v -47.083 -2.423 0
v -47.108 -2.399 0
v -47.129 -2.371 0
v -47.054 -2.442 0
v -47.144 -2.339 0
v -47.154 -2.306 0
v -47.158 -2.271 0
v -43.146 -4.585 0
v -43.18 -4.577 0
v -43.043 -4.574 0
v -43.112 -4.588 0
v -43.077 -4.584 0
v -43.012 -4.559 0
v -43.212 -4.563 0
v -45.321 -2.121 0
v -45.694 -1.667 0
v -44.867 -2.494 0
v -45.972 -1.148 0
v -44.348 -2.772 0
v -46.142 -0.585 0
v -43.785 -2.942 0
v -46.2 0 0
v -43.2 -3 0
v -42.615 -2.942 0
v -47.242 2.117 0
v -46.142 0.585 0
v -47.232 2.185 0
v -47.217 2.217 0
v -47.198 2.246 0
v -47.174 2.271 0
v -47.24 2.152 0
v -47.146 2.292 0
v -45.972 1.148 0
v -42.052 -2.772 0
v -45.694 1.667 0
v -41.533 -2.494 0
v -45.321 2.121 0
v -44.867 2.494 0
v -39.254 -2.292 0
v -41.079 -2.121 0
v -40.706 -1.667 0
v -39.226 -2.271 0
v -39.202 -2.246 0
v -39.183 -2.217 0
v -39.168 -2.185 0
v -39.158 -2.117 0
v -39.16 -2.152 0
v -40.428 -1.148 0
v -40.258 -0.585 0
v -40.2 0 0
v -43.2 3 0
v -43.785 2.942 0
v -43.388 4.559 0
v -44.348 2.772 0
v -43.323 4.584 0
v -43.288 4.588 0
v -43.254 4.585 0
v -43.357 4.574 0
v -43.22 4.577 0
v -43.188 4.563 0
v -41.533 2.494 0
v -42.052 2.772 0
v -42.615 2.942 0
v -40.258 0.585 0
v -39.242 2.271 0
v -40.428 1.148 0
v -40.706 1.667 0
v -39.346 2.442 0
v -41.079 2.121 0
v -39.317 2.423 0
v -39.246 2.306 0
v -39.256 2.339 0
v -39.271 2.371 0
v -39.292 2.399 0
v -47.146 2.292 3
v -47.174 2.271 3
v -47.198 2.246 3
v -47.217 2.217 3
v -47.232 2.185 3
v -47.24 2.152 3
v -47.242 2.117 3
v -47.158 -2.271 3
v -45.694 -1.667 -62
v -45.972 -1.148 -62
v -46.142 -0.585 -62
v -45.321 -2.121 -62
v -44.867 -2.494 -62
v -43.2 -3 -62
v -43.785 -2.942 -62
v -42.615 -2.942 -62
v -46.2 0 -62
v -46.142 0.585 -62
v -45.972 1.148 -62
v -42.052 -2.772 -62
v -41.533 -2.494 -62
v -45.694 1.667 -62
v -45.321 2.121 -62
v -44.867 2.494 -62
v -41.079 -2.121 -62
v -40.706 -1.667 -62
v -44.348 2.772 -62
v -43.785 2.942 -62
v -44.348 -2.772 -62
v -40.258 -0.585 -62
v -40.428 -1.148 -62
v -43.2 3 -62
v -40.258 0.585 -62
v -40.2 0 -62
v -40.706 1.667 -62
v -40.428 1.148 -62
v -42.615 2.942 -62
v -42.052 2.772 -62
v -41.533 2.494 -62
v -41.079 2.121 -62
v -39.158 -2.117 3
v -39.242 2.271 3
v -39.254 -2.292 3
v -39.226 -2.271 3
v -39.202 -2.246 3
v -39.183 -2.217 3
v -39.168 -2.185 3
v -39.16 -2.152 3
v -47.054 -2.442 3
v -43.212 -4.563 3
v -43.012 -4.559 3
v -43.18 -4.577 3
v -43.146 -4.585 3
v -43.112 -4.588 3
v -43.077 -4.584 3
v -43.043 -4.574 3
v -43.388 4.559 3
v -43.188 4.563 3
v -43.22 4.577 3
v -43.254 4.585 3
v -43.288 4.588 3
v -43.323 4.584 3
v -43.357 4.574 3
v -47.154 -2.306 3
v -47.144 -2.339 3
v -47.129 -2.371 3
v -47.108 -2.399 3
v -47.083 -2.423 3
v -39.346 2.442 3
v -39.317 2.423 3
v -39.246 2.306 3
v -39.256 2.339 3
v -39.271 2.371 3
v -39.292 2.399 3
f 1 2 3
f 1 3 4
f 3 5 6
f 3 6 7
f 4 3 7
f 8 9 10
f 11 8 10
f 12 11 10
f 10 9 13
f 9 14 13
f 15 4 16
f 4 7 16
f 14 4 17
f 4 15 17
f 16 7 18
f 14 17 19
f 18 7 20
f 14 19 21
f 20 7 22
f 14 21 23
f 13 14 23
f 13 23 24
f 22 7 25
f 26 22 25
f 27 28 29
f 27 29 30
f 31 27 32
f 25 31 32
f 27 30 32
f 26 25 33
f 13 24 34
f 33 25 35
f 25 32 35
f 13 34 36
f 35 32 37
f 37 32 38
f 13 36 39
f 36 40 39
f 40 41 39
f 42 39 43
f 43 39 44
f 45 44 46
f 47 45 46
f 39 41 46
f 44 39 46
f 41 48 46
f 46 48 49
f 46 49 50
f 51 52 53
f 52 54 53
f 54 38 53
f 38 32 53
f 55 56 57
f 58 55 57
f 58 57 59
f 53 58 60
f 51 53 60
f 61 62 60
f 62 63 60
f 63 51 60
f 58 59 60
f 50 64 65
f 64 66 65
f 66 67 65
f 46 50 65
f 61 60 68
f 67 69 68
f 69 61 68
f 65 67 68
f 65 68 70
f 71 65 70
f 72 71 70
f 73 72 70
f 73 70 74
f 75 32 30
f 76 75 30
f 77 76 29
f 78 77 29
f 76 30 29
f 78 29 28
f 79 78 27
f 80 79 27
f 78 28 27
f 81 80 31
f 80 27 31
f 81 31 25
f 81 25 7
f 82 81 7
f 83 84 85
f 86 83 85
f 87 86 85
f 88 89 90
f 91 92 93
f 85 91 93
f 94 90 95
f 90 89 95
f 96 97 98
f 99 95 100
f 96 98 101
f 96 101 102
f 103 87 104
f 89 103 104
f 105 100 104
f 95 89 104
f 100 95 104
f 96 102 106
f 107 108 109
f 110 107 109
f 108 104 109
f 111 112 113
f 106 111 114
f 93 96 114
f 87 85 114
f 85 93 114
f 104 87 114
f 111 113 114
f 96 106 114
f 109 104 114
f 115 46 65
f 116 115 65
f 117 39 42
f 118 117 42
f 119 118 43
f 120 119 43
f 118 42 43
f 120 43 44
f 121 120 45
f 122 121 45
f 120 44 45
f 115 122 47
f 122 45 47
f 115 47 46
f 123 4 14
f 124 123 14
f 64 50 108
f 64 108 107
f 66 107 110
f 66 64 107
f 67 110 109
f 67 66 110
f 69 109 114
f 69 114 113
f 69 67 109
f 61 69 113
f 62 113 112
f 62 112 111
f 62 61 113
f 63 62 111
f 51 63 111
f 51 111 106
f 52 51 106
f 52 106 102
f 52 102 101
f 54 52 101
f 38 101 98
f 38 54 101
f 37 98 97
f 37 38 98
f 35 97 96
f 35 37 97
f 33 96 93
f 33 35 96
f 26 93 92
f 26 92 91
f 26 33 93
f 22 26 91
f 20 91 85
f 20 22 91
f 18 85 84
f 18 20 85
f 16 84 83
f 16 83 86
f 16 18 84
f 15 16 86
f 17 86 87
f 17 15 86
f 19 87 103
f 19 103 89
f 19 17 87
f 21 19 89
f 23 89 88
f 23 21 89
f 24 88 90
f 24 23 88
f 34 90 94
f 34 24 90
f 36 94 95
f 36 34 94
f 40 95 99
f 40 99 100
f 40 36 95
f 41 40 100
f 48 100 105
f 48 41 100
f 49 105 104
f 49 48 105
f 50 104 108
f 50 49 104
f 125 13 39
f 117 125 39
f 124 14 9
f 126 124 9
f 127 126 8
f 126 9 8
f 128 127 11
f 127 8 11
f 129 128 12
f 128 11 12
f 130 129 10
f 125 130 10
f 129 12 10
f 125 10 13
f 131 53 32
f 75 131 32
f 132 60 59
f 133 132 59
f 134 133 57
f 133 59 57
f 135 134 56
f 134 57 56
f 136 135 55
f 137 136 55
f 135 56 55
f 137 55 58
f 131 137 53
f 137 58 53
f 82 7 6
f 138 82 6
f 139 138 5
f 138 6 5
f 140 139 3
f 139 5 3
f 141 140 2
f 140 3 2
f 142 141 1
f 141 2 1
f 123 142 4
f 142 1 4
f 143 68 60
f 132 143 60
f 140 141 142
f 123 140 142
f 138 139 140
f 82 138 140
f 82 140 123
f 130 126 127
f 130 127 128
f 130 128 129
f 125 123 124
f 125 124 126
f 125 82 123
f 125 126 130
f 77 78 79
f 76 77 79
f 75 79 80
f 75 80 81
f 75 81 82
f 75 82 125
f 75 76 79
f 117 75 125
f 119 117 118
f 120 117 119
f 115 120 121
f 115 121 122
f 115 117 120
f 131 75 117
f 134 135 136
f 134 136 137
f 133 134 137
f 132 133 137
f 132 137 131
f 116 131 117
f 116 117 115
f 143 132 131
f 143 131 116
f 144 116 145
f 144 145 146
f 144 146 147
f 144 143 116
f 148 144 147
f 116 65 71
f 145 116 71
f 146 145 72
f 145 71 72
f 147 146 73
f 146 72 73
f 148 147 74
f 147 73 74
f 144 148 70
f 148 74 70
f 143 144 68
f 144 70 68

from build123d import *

# Parameters (mm, degrees)
SKETCH1_R           = 3
BOSS_EXTRUDE1_DEPTH = 62
BOSS_EXTRUDE2_DEPTH = 3


with BuildPart() as part:
    # Sketch1 → Boss-Extrude1 (new body)
    with BuildSketch(Plane.XY):
        with Locations((-43.2, 0)):
            Circle(SKETCH1_R)
    extrude(amount=-BOSS_EXTRUDE1_DEPTH)

    # Sketch2 → Boss-Extrude2 (add)
    with BuildSketch(Plane.XY):
        with BuildLine():
            Line((-47.054399712, -2.442285905), (-43.212081089, -4.563004671))
            ThreePointArc((-43.212081089, -4.563004671), (-43.111583363, -4.58786779), (-43.012118219, -4.559151019))
            Line((-43.012118219, -4.559151019), (-39.254362582, -2.291964865))
            ThreePointArc((-39.254362582, -2.291964865), (-39.182581626, -2.217362841), (-39.157718507, -2.116865114))
            Line((-39.157718507, -2.116865114), (-39.242281493, 2.271039806))
            ThreePointArc((-39.242281493, 2.271039806), (-39.270998264, 2.370504949), (-39.345600288, 2.442285905))
            Line((-39.345600288, 2.442285905), (-43.187918911, 4.563004671))
            ThreePointArc((-43.187918911, 4.563004671), (-43.288416637, 4.58786779), (-43.387881781, 4.559151019))
            Line((-43.387881781, 4.559151019), (-47.145637418, 2.291964865))
            ThreePointArc((-47.145637418, 2.291964865), (-47.217418374, 2.217362841), (-47.242281493, 2.116865114))
            Line((-47.242281493, 2.116865114), (-47.157718507, -2.271039806))
            ThreePointArc((-47.157718507, -2.271039806), (-47.129001736, -2.370504949), (-47.054399712, -2.442285905))
        make_face()
    extrude(amount=BOSS_EXTRUDE2_DEPTH)


solid = part.part
